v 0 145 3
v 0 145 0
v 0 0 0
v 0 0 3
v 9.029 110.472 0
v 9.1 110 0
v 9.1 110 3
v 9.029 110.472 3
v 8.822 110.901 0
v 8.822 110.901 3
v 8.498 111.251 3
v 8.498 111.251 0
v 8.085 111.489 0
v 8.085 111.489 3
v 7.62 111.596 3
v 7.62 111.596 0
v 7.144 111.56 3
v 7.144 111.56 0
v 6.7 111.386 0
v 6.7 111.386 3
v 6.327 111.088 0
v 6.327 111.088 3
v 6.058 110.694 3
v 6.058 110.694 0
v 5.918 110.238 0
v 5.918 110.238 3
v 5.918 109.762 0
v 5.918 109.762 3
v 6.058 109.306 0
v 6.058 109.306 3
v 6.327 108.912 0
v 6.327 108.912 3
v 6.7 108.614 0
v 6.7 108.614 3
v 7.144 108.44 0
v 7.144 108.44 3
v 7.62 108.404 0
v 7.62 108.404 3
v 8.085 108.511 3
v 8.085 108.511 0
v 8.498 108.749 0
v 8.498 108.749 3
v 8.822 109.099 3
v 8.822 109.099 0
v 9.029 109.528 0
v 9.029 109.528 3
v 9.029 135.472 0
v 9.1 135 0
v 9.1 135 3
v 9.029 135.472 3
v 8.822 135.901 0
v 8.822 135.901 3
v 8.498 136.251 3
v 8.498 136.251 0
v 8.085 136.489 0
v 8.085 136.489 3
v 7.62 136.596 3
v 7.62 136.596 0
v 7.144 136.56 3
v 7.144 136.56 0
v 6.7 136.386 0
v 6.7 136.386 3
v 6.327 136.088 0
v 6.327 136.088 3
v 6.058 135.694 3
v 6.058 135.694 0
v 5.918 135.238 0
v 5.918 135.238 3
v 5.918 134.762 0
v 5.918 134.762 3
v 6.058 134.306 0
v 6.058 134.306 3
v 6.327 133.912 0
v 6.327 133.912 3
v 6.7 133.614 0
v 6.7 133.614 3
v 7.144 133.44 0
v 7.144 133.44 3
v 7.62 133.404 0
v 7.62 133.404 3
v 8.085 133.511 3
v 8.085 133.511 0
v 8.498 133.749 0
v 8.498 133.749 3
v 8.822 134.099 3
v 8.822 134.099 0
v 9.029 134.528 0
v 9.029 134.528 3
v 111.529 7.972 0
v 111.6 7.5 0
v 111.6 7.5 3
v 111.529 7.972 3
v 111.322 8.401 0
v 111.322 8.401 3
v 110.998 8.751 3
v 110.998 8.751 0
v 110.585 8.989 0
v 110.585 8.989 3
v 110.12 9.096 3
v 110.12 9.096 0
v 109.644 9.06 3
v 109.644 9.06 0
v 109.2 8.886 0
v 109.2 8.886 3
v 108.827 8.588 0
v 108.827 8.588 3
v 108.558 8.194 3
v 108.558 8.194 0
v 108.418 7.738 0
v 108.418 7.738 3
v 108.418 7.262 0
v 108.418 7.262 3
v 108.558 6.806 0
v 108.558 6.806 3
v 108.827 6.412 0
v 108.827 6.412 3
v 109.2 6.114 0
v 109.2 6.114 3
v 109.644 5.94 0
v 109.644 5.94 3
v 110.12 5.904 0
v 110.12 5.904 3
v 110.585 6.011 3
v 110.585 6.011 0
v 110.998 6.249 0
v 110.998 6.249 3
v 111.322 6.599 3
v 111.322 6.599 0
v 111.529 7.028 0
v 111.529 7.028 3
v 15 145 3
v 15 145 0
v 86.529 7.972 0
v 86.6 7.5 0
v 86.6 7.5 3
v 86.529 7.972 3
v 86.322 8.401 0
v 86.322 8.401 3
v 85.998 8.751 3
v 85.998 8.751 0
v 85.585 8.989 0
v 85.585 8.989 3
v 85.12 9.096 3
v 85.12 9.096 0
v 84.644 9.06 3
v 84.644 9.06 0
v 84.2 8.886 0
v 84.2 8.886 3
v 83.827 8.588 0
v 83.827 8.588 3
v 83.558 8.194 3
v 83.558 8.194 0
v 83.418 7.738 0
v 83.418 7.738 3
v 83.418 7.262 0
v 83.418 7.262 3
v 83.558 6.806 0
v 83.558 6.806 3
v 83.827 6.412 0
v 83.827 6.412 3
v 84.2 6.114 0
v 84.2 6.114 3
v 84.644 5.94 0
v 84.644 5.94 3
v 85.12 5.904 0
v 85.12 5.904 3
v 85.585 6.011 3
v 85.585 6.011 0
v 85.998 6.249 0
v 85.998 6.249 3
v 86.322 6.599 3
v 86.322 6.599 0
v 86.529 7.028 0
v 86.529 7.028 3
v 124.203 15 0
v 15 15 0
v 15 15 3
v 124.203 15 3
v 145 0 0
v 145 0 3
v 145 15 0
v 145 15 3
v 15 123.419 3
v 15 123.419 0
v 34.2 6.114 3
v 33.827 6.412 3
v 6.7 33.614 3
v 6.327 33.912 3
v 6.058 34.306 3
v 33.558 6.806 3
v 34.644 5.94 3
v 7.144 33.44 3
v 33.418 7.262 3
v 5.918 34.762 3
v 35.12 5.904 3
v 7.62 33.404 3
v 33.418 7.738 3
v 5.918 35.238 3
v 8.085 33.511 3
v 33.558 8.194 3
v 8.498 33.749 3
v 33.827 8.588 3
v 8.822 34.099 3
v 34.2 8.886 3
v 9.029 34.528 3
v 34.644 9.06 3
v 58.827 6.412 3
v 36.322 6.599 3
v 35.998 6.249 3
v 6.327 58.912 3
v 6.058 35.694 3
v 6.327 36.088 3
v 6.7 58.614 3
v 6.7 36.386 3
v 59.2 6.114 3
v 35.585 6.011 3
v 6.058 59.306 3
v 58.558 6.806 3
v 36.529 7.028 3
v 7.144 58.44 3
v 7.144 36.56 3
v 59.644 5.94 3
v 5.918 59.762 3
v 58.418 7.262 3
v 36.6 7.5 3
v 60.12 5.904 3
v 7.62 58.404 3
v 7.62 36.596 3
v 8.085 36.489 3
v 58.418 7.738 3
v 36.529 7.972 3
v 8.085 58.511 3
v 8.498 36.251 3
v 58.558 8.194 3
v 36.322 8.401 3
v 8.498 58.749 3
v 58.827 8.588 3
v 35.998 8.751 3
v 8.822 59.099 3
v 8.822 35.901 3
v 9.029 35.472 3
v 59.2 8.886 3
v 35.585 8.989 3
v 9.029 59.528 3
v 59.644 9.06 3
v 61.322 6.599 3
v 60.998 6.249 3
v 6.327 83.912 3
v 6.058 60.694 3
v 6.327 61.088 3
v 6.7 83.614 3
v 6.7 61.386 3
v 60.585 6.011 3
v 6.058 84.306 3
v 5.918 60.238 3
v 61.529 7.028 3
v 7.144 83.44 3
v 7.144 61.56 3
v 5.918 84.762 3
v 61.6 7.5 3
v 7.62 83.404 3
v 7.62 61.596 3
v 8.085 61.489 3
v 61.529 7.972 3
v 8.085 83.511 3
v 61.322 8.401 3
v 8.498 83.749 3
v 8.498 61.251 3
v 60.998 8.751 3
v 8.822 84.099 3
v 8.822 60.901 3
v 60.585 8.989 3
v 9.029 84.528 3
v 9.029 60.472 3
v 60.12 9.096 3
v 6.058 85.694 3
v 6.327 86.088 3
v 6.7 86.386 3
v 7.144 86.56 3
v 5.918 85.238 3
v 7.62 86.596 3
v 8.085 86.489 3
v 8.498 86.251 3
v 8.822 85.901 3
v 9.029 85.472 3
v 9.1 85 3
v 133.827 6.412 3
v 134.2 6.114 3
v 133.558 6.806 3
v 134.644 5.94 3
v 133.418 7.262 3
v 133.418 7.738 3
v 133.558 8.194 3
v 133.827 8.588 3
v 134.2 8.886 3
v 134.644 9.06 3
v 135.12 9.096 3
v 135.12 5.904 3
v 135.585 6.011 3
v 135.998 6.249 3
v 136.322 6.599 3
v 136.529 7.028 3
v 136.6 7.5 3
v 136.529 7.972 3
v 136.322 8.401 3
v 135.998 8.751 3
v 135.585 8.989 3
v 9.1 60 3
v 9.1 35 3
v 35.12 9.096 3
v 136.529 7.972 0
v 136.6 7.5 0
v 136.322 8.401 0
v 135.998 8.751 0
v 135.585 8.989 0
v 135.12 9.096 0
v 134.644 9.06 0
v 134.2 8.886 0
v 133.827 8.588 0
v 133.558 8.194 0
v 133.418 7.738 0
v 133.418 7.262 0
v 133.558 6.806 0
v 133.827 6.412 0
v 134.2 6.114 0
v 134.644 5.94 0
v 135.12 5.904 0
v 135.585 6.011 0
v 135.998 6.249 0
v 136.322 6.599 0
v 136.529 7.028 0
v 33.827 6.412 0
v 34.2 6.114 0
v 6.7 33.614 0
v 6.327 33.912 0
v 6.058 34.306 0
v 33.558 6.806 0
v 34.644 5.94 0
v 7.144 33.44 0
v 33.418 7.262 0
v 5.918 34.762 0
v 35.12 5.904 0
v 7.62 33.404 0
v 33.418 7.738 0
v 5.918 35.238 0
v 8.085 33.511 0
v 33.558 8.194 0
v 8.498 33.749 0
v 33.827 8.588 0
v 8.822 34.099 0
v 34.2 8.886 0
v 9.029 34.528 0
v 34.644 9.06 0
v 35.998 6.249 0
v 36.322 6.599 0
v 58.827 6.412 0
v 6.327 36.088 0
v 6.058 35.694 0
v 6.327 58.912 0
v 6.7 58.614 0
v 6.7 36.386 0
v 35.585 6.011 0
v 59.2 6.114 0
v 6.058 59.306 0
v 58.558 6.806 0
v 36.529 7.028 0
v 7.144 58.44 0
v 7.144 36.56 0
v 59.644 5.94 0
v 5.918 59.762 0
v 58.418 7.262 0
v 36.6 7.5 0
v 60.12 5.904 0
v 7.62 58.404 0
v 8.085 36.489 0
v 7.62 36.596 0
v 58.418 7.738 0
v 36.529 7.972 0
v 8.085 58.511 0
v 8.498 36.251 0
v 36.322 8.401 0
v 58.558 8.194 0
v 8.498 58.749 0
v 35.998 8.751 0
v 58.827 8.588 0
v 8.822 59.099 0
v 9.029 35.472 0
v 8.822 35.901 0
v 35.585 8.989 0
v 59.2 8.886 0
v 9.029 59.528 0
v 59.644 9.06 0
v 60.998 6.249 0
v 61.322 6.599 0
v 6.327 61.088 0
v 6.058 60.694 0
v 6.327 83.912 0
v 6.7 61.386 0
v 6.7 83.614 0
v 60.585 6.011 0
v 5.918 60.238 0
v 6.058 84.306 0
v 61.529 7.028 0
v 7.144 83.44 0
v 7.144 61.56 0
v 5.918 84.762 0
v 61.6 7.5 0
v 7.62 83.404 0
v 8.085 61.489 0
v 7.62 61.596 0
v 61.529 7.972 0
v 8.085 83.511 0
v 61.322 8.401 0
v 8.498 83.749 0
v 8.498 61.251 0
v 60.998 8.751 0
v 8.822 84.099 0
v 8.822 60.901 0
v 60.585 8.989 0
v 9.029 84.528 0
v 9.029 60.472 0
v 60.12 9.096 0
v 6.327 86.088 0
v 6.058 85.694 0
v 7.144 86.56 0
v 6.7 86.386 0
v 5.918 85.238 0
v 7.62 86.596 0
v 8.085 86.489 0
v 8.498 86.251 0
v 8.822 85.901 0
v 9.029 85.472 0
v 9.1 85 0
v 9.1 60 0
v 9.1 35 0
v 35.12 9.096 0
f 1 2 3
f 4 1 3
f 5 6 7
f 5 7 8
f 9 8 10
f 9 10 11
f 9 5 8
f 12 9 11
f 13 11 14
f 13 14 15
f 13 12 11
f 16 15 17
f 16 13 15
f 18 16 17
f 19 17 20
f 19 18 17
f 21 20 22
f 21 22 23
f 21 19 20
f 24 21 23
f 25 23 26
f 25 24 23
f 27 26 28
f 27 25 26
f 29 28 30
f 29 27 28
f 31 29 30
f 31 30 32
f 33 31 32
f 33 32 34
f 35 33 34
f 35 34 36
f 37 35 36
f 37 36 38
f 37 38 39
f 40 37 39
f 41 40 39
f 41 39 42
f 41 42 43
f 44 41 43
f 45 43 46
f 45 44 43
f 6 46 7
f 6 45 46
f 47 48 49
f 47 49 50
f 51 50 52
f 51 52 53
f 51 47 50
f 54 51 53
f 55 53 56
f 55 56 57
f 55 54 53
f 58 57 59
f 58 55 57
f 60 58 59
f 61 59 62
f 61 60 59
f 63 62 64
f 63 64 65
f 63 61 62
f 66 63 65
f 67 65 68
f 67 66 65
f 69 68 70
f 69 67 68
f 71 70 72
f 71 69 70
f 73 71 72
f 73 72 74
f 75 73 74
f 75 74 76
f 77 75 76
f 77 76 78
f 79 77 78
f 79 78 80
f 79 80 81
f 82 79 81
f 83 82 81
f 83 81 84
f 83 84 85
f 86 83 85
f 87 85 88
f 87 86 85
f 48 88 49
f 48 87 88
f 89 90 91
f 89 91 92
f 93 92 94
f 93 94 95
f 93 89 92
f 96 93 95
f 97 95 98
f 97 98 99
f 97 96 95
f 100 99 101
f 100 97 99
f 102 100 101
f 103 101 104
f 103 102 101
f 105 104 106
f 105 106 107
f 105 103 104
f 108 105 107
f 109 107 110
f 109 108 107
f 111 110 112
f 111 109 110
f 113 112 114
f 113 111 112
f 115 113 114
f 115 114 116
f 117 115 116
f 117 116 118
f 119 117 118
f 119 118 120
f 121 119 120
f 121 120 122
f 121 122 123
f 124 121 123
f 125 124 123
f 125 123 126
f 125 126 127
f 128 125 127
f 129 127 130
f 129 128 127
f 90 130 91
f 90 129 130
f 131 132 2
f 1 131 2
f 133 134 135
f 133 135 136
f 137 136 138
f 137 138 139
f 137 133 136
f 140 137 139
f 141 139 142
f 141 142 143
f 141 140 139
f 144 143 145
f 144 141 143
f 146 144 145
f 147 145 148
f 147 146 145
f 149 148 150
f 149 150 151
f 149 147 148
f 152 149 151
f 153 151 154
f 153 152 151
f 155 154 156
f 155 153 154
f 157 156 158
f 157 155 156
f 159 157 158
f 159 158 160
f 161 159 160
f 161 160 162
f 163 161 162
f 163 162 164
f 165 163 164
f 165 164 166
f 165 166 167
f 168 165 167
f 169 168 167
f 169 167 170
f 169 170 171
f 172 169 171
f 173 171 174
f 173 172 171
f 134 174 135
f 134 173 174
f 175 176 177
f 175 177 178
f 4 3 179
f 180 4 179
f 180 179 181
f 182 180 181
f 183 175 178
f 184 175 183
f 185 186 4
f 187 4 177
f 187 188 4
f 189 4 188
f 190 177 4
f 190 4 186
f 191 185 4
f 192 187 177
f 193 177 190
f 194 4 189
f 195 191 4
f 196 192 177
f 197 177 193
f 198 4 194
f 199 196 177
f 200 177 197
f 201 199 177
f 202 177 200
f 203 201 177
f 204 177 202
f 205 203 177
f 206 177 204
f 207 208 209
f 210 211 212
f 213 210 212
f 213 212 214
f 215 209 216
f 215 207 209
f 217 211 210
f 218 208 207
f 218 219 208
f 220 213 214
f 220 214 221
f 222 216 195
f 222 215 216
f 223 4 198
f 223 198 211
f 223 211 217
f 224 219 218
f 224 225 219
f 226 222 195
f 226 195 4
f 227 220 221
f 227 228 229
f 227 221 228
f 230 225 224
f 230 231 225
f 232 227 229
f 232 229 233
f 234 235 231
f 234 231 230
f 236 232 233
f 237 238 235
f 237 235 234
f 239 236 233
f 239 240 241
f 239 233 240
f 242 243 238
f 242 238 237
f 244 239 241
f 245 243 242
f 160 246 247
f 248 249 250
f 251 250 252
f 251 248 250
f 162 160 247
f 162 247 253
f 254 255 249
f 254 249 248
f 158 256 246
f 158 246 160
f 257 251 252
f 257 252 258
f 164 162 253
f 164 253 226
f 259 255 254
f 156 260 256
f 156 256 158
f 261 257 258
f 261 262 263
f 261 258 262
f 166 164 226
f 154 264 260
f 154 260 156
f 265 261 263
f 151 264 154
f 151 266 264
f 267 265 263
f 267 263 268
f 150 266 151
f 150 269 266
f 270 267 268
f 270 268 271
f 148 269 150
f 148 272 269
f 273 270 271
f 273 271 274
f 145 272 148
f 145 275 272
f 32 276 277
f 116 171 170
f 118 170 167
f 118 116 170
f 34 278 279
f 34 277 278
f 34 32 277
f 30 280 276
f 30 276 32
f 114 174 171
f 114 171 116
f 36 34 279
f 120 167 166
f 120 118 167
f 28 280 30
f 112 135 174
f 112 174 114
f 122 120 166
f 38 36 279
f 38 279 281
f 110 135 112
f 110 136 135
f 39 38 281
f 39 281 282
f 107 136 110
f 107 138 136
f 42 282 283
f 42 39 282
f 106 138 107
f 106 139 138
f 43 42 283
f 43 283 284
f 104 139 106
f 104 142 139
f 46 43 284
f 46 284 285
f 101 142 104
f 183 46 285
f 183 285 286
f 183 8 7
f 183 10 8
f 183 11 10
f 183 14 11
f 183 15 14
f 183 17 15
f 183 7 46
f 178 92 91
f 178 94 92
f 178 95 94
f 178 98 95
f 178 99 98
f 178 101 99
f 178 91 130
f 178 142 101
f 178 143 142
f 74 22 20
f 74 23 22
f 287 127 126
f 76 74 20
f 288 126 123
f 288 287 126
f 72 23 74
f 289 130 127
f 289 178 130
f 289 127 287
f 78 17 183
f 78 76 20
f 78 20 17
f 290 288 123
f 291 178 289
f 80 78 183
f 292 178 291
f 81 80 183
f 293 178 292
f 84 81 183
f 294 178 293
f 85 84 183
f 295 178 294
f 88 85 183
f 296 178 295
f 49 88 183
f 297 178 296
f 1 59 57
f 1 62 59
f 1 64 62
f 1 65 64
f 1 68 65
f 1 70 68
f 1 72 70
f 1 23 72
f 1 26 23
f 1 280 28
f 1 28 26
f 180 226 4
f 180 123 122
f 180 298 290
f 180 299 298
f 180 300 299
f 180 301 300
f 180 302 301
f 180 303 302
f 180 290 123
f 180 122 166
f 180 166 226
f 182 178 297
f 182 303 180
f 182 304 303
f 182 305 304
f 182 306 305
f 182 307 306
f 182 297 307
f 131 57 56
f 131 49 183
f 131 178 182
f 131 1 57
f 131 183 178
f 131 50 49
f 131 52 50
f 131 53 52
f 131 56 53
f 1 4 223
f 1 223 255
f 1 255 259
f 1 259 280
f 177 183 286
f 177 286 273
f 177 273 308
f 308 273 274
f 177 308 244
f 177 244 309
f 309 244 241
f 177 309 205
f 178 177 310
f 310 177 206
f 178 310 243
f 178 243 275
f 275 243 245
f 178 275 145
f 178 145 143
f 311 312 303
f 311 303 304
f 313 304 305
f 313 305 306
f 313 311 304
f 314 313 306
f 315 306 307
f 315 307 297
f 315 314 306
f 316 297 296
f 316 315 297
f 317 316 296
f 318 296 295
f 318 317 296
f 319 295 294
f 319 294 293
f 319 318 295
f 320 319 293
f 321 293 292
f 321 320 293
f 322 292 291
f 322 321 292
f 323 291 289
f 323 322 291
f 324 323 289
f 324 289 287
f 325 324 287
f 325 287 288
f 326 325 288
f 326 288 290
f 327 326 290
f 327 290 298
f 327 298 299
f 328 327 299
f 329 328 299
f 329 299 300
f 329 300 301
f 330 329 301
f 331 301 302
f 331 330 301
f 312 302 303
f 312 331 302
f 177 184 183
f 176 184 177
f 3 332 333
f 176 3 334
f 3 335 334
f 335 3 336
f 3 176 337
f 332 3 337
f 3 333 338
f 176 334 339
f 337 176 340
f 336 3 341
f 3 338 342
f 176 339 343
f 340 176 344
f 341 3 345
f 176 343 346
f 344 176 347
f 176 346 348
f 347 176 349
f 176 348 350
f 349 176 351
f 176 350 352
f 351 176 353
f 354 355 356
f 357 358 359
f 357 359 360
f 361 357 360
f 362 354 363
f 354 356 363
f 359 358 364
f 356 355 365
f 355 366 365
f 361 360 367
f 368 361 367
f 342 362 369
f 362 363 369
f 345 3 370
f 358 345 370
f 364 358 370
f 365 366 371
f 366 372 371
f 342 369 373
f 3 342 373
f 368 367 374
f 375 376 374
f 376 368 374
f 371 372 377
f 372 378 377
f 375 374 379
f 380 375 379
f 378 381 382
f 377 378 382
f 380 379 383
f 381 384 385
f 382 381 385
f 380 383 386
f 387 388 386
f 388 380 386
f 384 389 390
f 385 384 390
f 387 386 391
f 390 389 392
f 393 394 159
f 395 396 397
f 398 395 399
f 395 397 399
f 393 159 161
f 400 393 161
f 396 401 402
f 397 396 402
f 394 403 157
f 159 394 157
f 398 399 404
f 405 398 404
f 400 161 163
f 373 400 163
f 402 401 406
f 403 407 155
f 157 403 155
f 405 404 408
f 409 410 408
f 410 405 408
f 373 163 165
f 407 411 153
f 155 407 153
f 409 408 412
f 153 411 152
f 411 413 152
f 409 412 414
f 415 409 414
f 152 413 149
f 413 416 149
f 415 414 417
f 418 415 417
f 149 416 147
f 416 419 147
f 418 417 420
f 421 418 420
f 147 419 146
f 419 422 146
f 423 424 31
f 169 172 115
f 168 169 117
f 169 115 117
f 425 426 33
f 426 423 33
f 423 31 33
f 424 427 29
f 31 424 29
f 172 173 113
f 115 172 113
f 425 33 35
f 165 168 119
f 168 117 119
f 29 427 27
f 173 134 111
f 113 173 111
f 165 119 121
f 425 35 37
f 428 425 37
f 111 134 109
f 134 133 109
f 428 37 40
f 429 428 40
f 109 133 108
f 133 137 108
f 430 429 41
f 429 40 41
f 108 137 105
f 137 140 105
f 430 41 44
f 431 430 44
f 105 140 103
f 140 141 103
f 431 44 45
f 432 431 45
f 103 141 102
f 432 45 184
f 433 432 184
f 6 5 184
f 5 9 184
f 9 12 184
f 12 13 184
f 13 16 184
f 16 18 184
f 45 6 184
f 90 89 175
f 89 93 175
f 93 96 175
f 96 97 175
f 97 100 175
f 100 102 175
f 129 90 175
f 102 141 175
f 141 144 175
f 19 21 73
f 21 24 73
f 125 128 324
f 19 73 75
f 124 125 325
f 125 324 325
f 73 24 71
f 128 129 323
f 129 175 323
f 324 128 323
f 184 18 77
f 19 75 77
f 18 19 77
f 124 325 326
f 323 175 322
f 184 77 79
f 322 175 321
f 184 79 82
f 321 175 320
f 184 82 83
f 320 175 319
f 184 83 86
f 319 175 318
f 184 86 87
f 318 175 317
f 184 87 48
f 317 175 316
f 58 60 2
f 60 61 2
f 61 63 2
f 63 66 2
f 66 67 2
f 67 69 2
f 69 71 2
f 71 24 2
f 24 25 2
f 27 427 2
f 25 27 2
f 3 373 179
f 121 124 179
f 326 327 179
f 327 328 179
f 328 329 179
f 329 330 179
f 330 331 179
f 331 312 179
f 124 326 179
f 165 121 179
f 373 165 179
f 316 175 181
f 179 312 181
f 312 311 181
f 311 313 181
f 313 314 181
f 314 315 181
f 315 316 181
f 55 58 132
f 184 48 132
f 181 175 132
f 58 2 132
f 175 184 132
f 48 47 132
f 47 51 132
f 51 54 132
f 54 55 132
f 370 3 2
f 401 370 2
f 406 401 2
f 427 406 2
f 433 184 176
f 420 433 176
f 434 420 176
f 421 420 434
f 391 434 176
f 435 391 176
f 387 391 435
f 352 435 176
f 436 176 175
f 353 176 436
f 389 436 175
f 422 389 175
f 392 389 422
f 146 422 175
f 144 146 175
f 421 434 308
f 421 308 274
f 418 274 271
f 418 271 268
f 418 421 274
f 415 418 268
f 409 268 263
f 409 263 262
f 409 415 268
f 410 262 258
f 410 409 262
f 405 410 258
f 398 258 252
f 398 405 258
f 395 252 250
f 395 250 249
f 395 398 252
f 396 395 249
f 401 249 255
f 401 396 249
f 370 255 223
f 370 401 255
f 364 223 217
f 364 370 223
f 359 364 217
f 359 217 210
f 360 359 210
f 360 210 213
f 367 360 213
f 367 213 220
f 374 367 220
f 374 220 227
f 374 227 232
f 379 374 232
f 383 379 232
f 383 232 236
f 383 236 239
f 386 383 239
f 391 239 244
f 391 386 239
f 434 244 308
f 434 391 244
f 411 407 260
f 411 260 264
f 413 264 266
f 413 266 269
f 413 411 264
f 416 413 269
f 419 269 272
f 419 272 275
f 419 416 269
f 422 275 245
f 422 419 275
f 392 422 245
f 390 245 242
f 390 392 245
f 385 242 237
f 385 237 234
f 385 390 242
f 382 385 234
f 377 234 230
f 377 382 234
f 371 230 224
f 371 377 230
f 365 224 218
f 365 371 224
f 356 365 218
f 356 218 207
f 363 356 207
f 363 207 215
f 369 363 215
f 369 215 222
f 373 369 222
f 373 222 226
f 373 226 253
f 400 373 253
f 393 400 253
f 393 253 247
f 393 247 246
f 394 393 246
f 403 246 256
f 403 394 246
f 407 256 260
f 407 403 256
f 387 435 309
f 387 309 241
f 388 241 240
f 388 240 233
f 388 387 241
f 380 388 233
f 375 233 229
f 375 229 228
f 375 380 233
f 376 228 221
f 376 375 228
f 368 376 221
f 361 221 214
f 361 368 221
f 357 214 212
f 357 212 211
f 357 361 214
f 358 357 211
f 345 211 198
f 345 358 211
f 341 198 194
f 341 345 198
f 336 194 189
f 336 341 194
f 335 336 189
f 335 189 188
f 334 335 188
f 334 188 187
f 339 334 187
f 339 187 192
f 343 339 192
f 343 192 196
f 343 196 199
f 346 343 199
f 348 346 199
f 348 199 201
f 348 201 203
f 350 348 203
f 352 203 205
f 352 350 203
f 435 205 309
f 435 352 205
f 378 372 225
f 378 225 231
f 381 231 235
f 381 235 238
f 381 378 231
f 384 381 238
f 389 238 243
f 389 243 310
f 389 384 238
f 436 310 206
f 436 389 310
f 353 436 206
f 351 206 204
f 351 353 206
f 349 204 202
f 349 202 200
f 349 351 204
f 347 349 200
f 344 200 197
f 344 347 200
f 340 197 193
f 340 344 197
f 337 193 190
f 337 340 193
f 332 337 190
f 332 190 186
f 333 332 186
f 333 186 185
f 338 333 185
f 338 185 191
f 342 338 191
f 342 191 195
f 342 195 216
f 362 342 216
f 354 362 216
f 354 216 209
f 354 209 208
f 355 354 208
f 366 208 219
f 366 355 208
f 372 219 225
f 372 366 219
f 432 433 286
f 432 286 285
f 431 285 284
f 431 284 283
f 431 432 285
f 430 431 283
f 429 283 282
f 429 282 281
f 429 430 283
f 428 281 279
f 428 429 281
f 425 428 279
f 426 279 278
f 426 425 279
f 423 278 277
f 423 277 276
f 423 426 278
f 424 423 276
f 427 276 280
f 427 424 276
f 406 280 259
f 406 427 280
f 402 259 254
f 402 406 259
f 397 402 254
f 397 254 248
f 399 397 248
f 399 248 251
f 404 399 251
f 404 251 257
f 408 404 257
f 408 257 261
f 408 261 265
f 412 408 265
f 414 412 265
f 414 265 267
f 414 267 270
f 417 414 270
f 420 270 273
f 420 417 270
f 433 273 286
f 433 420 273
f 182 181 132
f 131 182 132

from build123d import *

# Parameters (mm, degrees)
SKETCH1_R           = 1.6
BOSS_EXTRUDE1_DEPTH = 3


with BuildPart() as part:
    # Sketch1 → Boss-Extrude1 (new body)
    with BuildSketch(Plane.XY):
        Polygon((0, 145), (0, 0), (145, 0), (145, 15), (15, 145), align=None)
        with Locations((135, 7.5)):
            Circle(SKETCH1_R, mode=Mode.SUBTRACT)
        with Locations((110, 7.5)):
            Circle(SKETCH1_R, mode=Mode.SUBTRACT)
        with Locations((85, 7.5)):
            Circle(SKETCH1_R, mode=Mode.SUBTRACT)
        with Locations((60, 7.5)):
            Circle(SKETCH1_R, mode=Mode.SUBTRACT)
        with Locations((35, 7.5)):
            Circle(SKETCH1_R, mode=Mode.SUBTRACT)
        with Locations((7.5, 135)):
            Circle(SKETCH1_R, mode=Mode.SUBTRACT)
        with Locations((7.5, 110)):
            Circle(SKETCH1_R, mode=Mode.SUBTRACT)
        with Locations((7.5, 85)):
            Circle(SKETCH1_R, mode=Mode.SUBTRACT)
        with Locations((7.5, 60)):
            Circle(SKETCH1_R, mode=Mode.SUBTRACT)
        with Locations((7.5, 35)):
            Circle(SKETCH1_R, mode=Mode.SUBTRACT)
        Polygon((15, 123.418535773), (15, 15), (124.2033211, 15), align=None, mode=Mode.SUBTRACT)
    extrude(amount=BOSS_EXTRUDE1_DEPTH)


solid = part.part
